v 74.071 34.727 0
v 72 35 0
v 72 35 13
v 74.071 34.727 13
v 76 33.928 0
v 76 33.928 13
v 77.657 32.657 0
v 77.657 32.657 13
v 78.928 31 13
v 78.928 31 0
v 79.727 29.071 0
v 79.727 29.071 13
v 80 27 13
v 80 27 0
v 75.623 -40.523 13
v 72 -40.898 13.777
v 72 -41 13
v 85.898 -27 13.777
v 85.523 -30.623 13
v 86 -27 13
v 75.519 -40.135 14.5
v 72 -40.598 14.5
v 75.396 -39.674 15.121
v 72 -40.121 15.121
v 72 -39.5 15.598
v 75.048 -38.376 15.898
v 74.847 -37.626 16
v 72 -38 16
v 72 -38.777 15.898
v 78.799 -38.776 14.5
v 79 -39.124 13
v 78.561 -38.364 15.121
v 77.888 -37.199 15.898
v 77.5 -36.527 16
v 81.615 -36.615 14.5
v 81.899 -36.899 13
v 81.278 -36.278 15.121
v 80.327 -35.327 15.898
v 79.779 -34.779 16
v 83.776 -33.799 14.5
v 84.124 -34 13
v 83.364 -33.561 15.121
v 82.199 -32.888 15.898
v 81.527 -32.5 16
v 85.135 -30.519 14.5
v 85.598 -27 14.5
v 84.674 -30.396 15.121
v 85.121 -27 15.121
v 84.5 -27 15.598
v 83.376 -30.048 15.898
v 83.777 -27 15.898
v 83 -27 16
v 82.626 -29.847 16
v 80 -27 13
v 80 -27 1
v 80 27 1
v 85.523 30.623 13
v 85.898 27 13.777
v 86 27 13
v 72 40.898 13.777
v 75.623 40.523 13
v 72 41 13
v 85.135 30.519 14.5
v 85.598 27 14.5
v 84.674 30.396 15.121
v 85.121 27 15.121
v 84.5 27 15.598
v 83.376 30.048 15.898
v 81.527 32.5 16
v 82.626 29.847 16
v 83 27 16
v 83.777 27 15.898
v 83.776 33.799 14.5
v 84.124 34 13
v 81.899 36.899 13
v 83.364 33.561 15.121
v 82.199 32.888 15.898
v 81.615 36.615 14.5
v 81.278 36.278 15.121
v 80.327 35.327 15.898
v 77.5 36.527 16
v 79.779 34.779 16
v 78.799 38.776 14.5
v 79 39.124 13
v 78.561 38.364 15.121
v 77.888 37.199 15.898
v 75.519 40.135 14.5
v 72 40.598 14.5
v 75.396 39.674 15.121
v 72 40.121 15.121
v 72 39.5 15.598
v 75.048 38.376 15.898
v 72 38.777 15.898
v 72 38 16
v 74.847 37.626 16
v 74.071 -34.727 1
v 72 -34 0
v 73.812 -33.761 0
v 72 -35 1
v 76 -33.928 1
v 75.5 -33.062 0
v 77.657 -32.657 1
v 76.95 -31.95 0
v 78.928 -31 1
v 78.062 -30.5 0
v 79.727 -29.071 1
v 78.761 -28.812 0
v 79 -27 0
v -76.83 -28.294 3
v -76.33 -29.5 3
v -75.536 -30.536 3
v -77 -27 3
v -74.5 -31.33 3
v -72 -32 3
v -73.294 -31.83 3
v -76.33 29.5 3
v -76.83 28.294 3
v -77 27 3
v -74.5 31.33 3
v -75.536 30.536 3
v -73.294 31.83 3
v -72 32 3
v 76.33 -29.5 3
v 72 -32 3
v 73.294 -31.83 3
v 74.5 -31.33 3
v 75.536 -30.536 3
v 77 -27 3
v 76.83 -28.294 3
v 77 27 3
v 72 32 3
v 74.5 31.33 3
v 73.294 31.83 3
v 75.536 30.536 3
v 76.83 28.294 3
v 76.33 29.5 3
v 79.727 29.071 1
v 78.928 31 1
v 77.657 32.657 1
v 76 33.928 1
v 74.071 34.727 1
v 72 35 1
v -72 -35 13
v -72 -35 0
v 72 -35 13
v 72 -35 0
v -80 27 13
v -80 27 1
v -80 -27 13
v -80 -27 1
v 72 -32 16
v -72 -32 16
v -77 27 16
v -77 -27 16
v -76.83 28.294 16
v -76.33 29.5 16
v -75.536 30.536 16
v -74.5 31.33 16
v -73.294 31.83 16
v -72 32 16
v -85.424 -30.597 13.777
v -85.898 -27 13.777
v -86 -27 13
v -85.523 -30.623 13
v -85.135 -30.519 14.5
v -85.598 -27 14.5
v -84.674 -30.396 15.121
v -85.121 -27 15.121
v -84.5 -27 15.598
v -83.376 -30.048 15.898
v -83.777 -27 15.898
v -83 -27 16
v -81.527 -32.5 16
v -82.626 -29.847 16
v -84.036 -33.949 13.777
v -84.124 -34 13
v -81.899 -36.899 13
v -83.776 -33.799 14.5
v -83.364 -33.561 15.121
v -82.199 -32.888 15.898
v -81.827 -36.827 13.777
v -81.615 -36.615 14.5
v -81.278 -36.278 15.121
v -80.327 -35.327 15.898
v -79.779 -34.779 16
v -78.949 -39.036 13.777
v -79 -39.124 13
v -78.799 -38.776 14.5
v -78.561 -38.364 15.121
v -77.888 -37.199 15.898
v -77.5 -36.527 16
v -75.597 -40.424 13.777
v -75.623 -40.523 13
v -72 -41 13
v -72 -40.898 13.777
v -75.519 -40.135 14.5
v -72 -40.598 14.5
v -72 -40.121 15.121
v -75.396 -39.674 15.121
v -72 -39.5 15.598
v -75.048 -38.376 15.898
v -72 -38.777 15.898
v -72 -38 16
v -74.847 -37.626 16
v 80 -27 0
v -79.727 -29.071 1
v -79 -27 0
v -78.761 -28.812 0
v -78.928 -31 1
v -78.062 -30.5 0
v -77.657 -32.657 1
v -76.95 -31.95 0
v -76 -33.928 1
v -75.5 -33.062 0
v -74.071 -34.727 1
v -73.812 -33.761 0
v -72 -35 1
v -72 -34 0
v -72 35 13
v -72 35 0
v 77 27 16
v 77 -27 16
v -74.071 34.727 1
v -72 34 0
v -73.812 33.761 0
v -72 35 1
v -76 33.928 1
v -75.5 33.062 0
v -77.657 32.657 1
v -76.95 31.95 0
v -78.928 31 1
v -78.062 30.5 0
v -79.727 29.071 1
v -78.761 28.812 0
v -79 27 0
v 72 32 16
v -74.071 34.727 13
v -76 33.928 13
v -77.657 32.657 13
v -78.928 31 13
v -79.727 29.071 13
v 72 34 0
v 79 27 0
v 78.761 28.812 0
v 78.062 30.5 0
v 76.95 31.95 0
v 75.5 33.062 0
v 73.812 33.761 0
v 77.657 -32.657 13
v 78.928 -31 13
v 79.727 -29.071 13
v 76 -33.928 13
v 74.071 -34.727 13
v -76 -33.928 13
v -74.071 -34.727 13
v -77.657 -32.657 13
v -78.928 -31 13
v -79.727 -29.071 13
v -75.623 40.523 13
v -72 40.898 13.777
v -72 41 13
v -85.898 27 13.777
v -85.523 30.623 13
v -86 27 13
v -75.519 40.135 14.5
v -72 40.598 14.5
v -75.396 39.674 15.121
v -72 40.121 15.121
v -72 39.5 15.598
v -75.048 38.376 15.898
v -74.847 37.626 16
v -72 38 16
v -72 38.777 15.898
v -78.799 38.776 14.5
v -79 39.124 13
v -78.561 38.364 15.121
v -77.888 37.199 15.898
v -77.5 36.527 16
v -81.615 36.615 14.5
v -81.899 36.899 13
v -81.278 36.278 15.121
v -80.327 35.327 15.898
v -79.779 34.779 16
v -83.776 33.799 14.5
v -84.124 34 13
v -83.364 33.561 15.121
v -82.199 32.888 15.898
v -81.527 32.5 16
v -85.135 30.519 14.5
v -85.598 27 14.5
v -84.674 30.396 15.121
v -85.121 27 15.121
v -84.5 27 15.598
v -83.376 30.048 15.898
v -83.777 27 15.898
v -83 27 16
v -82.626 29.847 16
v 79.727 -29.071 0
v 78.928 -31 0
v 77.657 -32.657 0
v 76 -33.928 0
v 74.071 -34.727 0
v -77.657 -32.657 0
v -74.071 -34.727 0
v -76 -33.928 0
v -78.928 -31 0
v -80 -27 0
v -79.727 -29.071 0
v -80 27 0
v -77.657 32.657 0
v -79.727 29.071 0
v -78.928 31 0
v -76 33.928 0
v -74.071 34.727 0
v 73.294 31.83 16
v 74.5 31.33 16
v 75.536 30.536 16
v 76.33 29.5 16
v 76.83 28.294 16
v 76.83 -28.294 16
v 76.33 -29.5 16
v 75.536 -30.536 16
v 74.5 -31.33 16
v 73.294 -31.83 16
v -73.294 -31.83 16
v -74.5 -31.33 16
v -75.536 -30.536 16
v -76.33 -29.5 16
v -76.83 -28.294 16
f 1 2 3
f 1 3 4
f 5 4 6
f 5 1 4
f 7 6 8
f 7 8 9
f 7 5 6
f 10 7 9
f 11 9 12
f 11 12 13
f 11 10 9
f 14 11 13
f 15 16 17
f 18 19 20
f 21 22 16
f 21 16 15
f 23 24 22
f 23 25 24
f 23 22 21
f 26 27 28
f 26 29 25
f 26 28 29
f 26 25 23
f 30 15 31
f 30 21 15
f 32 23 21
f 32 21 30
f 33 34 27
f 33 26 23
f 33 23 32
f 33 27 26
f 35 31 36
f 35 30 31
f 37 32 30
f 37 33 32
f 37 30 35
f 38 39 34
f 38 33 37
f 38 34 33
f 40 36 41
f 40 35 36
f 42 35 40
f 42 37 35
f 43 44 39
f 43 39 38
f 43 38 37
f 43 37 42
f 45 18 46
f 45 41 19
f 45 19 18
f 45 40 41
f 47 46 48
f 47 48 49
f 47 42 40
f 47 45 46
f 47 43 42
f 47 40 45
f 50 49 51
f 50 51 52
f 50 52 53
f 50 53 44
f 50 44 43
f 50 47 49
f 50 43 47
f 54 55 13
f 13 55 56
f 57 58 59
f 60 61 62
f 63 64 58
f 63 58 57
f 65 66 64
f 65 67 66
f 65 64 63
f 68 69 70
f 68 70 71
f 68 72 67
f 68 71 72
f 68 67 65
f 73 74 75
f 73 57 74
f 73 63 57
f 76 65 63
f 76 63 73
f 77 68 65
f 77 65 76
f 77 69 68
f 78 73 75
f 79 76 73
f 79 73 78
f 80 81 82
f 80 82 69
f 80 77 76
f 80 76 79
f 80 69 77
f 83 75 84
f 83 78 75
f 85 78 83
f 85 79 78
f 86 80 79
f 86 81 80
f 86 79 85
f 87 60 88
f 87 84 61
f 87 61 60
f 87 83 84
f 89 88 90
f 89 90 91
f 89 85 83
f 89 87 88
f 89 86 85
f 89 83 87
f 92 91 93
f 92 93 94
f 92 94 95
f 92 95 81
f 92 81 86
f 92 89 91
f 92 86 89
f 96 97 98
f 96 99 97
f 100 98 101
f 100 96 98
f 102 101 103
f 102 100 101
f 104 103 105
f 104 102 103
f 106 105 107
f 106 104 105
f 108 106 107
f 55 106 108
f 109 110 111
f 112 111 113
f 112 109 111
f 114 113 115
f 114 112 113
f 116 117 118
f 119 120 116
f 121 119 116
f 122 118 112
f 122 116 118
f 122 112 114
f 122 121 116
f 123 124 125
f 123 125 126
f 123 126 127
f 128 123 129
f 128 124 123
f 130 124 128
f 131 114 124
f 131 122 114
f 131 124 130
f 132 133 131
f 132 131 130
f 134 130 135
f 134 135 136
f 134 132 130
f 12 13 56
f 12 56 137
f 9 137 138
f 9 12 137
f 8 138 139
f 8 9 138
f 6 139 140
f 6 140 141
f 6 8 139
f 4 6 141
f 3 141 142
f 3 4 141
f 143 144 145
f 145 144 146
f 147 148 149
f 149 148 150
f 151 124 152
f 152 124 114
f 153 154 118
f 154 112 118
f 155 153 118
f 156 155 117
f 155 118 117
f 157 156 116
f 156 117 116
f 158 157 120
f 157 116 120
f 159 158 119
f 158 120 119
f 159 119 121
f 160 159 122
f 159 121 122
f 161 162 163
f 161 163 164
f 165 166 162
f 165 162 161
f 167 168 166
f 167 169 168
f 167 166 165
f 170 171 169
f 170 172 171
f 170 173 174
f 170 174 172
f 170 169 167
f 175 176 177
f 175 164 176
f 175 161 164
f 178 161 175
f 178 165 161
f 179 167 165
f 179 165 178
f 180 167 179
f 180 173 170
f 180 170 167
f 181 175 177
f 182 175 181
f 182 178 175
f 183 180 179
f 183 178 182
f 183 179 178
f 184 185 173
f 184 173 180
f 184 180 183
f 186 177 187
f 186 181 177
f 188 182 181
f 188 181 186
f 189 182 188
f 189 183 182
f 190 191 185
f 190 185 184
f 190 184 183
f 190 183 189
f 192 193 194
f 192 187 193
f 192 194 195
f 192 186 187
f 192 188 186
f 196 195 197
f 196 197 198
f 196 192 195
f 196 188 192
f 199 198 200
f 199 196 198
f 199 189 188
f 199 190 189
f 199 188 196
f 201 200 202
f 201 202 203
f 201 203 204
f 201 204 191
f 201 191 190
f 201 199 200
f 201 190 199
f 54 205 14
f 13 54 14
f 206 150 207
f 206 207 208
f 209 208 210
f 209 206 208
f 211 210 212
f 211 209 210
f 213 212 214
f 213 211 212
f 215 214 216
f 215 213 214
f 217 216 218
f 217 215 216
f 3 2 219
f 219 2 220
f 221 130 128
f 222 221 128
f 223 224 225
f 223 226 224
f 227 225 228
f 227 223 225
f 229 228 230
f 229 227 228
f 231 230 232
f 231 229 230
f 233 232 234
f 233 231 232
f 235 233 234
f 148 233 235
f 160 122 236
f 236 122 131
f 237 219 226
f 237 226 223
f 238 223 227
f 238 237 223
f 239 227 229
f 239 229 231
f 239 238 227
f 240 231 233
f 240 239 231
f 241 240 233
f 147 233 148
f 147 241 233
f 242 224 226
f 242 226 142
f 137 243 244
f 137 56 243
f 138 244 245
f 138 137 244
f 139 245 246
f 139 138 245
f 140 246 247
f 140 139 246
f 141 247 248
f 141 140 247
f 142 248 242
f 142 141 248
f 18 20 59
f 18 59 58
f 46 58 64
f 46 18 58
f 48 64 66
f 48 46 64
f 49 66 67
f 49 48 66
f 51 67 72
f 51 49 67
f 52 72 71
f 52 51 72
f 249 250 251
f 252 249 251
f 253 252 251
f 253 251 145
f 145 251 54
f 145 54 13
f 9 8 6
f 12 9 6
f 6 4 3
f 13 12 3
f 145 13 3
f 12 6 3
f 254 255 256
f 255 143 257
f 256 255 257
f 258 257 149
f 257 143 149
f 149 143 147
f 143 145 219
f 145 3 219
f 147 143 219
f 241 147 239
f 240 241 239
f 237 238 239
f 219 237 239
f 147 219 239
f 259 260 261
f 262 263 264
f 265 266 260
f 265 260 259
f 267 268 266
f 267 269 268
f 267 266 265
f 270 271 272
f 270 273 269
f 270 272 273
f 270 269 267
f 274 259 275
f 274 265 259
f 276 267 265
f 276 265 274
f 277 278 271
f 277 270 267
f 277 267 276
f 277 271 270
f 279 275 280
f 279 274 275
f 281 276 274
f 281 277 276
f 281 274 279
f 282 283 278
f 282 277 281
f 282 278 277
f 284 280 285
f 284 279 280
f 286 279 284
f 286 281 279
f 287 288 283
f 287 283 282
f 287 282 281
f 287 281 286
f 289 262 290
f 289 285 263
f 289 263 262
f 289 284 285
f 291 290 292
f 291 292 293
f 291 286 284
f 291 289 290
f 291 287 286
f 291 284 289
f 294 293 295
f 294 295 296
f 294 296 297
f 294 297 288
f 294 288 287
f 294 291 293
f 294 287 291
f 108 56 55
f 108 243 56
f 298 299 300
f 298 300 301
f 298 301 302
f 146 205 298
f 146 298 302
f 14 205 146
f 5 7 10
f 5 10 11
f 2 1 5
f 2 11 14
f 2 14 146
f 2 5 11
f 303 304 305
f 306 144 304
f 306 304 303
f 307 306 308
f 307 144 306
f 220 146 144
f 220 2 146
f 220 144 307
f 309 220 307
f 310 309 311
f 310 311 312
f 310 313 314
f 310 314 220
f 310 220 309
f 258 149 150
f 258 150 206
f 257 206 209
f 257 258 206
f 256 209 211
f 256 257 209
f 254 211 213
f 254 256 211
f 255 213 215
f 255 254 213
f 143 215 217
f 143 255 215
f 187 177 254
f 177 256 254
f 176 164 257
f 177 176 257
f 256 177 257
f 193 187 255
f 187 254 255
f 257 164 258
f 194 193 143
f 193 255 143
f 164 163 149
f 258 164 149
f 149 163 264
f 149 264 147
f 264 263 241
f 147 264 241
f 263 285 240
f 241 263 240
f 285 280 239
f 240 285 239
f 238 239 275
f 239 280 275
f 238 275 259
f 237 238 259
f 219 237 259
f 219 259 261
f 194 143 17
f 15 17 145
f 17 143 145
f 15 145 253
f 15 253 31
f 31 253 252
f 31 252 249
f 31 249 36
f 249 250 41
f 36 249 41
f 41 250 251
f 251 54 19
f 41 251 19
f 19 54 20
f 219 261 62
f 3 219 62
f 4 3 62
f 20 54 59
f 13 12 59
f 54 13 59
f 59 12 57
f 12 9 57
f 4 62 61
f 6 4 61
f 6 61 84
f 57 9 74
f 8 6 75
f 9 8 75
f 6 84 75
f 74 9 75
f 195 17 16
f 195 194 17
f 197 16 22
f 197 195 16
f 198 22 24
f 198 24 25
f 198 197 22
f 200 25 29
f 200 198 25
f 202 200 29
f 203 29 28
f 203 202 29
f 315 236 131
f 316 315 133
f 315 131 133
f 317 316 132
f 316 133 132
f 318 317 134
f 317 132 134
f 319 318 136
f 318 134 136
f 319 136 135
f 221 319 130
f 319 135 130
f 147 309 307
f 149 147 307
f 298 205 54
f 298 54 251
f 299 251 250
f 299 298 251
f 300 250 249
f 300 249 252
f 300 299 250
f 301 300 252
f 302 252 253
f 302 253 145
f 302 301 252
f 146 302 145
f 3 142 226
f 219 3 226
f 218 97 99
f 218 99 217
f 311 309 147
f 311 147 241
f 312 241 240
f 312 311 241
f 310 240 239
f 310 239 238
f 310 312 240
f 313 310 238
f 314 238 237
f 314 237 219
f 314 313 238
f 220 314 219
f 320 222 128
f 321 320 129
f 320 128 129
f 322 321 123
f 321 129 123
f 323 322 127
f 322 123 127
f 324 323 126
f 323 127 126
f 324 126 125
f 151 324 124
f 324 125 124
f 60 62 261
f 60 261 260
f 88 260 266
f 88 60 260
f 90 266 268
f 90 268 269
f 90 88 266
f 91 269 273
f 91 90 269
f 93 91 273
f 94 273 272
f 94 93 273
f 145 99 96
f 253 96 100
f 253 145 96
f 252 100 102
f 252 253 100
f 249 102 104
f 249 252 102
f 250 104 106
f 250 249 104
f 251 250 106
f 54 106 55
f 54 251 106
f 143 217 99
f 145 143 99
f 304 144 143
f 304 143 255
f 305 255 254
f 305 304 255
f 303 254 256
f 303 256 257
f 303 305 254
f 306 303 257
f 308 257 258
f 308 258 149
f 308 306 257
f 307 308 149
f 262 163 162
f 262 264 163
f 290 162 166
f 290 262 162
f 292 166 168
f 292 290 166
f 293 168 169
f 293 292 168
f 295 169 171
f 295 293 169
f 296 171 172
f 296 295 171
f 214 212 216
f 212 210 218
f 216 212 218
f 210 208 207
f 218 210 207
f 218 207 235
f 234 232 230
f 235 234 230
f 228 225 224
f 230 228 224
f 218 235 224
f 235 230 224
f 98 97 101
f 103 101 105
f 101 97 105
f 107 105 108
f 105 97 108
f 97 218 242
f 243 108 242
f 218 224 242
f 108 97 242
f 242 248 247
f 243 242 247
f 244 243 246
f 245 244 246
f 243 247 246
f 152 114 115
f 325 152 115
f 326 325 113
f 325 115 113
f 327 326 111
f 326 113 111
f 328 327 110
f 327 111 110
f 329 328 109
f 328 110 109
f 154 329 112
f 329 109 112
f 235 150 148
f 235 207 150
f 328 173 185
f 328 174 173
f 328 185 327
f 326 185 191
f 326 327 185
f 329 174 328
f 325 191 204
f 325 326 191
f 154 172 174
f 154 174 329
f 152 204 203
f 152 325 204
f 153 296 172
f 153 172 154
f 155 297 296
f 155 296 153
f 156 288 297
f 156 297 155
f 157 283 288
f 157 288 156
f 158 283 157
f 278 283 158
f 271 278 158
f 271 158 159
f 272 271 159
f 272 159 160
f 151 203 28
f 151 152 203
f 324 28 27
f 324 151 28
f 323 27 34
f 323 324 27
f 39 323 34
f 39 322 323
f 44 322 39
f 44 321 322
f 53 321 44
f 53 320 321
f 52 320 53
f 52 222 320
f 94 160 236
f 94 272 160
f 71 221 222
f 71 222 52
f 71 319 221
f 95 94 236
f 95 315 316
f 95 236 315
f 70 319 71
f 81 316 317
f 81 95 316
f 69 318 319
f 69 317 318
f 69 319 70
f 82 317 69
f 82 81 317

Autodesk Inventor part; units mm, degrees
ref_plane "YZ Plane" through (0, 0, 0) normal (1, 0, 0) x (0, 1, 0)
ref_plane "XZ Plane" through (0, 0, 0) normal (0, 1, 0) x (-1, 0, 0)
ref_plane "XY Plane" through (0, 0, 0) normal (0, 0, 1) x (1, 0, 0)
sketch "Sketch1" plane through (0, 0, 0) normal (0, 0, 1) x (1, 0, 0)
  line L0 (-80, -35) -> (80, -35)
  line L1 (80, -35) -> (80, 35)
  line L2 (80, 35) -> (-80, 35)
  line L3 (-80, 35) -> (-80, -35)
  line L4 (-80, -35) -> (80, 35) construction
  line L5 (80, -35) -> (-80, 35) construction
  point P0 (0, 0)
extrude "Extrusion1" add sketch "Sketch1" along normal blind 13
fillet "Fillet1" radius 8 4 edges at (-80, -35, 6.5) (-80, 35, 6.5) (80, -35, 6.5) (80, 35, 6.5)
shell "Shell1" thickness 3 removed faces 1 at (24, -11.6667, 13)
sketch "Sketch2" plane through (0, 0, 13) normal (0, 0, 1) x (1, 0, 0)
  arc A0 (80, 27) -> (72, 35) centre (72, 27) ccw projected
  line L0 (72, 35) -> (-72, 35) projected
  arc A1 (-72, 35) -> (-80, 27) centre (-72, 27) ccw projected
  line L1 (-80, 27) -> (-80, -27) projected
  arc A2 (-80, -27) -> (-72, -35) centre (-72, -27) ccw projected
  line L2 (-72, -35) -> (72, -35) projected
  arc A3 (72, -35) -> (80, -27) centre (72, -27) ccw projected
  line L3 (80, -27) -> (80, 27) projected
  line L4 (-72, 41) -> (72, 41)
  arc A4 (86, 27) -> (72, 41) centre (72, 27) ccw
  line L5 (86, 27) -> (86, -27)
  arc A5 (72, -41) -> (86, -27) centre (72, -27) ccw
  line L6 (72, -41) -> (-72, -41)
  arc A6 (-86, -27) -> (-72, -41) centre (-72, -27) ccw
  line L7 (-86, -27) -> (-86, 27)
  arc A7 (-72, 41) -> (-86, 27) centre (-72, 27) ccw
  arc A8 (-72, 32) -> (-77, 27) centre (-72, 27) ccw projected
  line L8 (-72, 32) -> (72, 32) projected
  arc A9 (77, 27) -> (72, 32) centre (72, 27) ccw projected
  line L9 (77, 27) -> (77, -27) projected
  arc A10 (72, -32) -> (77, -27) centre (72, -27) ccw projected
  line L10 (72, -32) -> (-72, -32) projected
  arc A11 (-77, -27) -> (-72, -32) centre (-72, -27) ccw projected
  line L11 (-77, -27) -> (-77, 27) projected
  arc A12 (80, 27) -> (72, 35) centre (72, 27) ccw projected
  line L12 (72, 35) -> (-72, 35) projected
  arc A13 (-72, 35) -> (-80, 27) centre (-72, 27) ccw projected
  line L13 (-80, 27) -> (-80, -27) projected
  arc A14 (-80, -27) -> (-72, -35) centre (-72, -27) ccw projected
  line L14 (-72, -35) -> (72, -35) projected
  arc A15 (72, -35) -> (80, -27) centre (72, -27) ccw projected
  line L15 (80, -27) -> (80, 27) projected
  point P0 (0, 0)
  dimension "d5" = 6
extrude "Extrusion2" add sketch "Sketch2" along normal blind 3 contours L3 A3 L2 A2 L1 A1 L0 A0 | L4 A4 L5 A5 L6 A6 L7 A7
fillet "Fillet2" radius 3 8 edges at (-86, 0, 16) (-81.8995, -36.8995, 16) (0, -41, 16) (81.8995, -36.8995, 16) (86, 0, 16) (81.8995, 36.8995, 16) (0, 41, 16) (-81.8995, 36.8995, 16)
sketch "Sketch3" plane through (0, 0, 0) normal (0, 0, -1) x (-1, 0, 0)
  arc A0 (-72, 35) -> (-80, 27) centre (-72, 27) ccw projected
  line L0 (-80, -27) -> (-80, 27) projected
  arc A1 (-80, -27) -> (-72, -35) centre (-72, -27) ccw projected
  line L1 (72, -35) -> (-72, -35) projected
  arc A2 (72, -35) -> (80, -27) centre (72, -27) ccw projected
  line L2 (80, 27) -> (80, -27) projected
  arc A3 (80, 27) -> (72, 35) centre (72, 27) ccw projected
  line L3 (-72, 35) -> (72, 35) projected
  point P0 (0, 0)
chamfer "Chamfer1" distance 1 angle 45 8 edges at (-80, 0, 0) (-77.6569, -32.6569, 0) (0, -35, 0) (77.6569, -32.6569, 0) (80, 0, 0) (77.6569, 32.6569, 0) (0, 35, 0) (-77.6569, 32.6569, 0)
extrude "Extrusion3" add sketch "Sketch3" against normal up to surface (13 mm away) separate body
sketch "Sketch4" plane through (-72, 35, 13) normal (0, 0, 1) x (1, 0, 0)
  line L0 (152, -8) -> (152, -62) projected
  line L1 (0, 0) -> (144, 0) projected
  point P0 (72, -35)
  point P1 (152, -35)
  point P2 (72, 0)
equation "\"zzz\" = 1"
properties part number "Holder for paper clips-01" material "Polycarbonate, Smoke"
